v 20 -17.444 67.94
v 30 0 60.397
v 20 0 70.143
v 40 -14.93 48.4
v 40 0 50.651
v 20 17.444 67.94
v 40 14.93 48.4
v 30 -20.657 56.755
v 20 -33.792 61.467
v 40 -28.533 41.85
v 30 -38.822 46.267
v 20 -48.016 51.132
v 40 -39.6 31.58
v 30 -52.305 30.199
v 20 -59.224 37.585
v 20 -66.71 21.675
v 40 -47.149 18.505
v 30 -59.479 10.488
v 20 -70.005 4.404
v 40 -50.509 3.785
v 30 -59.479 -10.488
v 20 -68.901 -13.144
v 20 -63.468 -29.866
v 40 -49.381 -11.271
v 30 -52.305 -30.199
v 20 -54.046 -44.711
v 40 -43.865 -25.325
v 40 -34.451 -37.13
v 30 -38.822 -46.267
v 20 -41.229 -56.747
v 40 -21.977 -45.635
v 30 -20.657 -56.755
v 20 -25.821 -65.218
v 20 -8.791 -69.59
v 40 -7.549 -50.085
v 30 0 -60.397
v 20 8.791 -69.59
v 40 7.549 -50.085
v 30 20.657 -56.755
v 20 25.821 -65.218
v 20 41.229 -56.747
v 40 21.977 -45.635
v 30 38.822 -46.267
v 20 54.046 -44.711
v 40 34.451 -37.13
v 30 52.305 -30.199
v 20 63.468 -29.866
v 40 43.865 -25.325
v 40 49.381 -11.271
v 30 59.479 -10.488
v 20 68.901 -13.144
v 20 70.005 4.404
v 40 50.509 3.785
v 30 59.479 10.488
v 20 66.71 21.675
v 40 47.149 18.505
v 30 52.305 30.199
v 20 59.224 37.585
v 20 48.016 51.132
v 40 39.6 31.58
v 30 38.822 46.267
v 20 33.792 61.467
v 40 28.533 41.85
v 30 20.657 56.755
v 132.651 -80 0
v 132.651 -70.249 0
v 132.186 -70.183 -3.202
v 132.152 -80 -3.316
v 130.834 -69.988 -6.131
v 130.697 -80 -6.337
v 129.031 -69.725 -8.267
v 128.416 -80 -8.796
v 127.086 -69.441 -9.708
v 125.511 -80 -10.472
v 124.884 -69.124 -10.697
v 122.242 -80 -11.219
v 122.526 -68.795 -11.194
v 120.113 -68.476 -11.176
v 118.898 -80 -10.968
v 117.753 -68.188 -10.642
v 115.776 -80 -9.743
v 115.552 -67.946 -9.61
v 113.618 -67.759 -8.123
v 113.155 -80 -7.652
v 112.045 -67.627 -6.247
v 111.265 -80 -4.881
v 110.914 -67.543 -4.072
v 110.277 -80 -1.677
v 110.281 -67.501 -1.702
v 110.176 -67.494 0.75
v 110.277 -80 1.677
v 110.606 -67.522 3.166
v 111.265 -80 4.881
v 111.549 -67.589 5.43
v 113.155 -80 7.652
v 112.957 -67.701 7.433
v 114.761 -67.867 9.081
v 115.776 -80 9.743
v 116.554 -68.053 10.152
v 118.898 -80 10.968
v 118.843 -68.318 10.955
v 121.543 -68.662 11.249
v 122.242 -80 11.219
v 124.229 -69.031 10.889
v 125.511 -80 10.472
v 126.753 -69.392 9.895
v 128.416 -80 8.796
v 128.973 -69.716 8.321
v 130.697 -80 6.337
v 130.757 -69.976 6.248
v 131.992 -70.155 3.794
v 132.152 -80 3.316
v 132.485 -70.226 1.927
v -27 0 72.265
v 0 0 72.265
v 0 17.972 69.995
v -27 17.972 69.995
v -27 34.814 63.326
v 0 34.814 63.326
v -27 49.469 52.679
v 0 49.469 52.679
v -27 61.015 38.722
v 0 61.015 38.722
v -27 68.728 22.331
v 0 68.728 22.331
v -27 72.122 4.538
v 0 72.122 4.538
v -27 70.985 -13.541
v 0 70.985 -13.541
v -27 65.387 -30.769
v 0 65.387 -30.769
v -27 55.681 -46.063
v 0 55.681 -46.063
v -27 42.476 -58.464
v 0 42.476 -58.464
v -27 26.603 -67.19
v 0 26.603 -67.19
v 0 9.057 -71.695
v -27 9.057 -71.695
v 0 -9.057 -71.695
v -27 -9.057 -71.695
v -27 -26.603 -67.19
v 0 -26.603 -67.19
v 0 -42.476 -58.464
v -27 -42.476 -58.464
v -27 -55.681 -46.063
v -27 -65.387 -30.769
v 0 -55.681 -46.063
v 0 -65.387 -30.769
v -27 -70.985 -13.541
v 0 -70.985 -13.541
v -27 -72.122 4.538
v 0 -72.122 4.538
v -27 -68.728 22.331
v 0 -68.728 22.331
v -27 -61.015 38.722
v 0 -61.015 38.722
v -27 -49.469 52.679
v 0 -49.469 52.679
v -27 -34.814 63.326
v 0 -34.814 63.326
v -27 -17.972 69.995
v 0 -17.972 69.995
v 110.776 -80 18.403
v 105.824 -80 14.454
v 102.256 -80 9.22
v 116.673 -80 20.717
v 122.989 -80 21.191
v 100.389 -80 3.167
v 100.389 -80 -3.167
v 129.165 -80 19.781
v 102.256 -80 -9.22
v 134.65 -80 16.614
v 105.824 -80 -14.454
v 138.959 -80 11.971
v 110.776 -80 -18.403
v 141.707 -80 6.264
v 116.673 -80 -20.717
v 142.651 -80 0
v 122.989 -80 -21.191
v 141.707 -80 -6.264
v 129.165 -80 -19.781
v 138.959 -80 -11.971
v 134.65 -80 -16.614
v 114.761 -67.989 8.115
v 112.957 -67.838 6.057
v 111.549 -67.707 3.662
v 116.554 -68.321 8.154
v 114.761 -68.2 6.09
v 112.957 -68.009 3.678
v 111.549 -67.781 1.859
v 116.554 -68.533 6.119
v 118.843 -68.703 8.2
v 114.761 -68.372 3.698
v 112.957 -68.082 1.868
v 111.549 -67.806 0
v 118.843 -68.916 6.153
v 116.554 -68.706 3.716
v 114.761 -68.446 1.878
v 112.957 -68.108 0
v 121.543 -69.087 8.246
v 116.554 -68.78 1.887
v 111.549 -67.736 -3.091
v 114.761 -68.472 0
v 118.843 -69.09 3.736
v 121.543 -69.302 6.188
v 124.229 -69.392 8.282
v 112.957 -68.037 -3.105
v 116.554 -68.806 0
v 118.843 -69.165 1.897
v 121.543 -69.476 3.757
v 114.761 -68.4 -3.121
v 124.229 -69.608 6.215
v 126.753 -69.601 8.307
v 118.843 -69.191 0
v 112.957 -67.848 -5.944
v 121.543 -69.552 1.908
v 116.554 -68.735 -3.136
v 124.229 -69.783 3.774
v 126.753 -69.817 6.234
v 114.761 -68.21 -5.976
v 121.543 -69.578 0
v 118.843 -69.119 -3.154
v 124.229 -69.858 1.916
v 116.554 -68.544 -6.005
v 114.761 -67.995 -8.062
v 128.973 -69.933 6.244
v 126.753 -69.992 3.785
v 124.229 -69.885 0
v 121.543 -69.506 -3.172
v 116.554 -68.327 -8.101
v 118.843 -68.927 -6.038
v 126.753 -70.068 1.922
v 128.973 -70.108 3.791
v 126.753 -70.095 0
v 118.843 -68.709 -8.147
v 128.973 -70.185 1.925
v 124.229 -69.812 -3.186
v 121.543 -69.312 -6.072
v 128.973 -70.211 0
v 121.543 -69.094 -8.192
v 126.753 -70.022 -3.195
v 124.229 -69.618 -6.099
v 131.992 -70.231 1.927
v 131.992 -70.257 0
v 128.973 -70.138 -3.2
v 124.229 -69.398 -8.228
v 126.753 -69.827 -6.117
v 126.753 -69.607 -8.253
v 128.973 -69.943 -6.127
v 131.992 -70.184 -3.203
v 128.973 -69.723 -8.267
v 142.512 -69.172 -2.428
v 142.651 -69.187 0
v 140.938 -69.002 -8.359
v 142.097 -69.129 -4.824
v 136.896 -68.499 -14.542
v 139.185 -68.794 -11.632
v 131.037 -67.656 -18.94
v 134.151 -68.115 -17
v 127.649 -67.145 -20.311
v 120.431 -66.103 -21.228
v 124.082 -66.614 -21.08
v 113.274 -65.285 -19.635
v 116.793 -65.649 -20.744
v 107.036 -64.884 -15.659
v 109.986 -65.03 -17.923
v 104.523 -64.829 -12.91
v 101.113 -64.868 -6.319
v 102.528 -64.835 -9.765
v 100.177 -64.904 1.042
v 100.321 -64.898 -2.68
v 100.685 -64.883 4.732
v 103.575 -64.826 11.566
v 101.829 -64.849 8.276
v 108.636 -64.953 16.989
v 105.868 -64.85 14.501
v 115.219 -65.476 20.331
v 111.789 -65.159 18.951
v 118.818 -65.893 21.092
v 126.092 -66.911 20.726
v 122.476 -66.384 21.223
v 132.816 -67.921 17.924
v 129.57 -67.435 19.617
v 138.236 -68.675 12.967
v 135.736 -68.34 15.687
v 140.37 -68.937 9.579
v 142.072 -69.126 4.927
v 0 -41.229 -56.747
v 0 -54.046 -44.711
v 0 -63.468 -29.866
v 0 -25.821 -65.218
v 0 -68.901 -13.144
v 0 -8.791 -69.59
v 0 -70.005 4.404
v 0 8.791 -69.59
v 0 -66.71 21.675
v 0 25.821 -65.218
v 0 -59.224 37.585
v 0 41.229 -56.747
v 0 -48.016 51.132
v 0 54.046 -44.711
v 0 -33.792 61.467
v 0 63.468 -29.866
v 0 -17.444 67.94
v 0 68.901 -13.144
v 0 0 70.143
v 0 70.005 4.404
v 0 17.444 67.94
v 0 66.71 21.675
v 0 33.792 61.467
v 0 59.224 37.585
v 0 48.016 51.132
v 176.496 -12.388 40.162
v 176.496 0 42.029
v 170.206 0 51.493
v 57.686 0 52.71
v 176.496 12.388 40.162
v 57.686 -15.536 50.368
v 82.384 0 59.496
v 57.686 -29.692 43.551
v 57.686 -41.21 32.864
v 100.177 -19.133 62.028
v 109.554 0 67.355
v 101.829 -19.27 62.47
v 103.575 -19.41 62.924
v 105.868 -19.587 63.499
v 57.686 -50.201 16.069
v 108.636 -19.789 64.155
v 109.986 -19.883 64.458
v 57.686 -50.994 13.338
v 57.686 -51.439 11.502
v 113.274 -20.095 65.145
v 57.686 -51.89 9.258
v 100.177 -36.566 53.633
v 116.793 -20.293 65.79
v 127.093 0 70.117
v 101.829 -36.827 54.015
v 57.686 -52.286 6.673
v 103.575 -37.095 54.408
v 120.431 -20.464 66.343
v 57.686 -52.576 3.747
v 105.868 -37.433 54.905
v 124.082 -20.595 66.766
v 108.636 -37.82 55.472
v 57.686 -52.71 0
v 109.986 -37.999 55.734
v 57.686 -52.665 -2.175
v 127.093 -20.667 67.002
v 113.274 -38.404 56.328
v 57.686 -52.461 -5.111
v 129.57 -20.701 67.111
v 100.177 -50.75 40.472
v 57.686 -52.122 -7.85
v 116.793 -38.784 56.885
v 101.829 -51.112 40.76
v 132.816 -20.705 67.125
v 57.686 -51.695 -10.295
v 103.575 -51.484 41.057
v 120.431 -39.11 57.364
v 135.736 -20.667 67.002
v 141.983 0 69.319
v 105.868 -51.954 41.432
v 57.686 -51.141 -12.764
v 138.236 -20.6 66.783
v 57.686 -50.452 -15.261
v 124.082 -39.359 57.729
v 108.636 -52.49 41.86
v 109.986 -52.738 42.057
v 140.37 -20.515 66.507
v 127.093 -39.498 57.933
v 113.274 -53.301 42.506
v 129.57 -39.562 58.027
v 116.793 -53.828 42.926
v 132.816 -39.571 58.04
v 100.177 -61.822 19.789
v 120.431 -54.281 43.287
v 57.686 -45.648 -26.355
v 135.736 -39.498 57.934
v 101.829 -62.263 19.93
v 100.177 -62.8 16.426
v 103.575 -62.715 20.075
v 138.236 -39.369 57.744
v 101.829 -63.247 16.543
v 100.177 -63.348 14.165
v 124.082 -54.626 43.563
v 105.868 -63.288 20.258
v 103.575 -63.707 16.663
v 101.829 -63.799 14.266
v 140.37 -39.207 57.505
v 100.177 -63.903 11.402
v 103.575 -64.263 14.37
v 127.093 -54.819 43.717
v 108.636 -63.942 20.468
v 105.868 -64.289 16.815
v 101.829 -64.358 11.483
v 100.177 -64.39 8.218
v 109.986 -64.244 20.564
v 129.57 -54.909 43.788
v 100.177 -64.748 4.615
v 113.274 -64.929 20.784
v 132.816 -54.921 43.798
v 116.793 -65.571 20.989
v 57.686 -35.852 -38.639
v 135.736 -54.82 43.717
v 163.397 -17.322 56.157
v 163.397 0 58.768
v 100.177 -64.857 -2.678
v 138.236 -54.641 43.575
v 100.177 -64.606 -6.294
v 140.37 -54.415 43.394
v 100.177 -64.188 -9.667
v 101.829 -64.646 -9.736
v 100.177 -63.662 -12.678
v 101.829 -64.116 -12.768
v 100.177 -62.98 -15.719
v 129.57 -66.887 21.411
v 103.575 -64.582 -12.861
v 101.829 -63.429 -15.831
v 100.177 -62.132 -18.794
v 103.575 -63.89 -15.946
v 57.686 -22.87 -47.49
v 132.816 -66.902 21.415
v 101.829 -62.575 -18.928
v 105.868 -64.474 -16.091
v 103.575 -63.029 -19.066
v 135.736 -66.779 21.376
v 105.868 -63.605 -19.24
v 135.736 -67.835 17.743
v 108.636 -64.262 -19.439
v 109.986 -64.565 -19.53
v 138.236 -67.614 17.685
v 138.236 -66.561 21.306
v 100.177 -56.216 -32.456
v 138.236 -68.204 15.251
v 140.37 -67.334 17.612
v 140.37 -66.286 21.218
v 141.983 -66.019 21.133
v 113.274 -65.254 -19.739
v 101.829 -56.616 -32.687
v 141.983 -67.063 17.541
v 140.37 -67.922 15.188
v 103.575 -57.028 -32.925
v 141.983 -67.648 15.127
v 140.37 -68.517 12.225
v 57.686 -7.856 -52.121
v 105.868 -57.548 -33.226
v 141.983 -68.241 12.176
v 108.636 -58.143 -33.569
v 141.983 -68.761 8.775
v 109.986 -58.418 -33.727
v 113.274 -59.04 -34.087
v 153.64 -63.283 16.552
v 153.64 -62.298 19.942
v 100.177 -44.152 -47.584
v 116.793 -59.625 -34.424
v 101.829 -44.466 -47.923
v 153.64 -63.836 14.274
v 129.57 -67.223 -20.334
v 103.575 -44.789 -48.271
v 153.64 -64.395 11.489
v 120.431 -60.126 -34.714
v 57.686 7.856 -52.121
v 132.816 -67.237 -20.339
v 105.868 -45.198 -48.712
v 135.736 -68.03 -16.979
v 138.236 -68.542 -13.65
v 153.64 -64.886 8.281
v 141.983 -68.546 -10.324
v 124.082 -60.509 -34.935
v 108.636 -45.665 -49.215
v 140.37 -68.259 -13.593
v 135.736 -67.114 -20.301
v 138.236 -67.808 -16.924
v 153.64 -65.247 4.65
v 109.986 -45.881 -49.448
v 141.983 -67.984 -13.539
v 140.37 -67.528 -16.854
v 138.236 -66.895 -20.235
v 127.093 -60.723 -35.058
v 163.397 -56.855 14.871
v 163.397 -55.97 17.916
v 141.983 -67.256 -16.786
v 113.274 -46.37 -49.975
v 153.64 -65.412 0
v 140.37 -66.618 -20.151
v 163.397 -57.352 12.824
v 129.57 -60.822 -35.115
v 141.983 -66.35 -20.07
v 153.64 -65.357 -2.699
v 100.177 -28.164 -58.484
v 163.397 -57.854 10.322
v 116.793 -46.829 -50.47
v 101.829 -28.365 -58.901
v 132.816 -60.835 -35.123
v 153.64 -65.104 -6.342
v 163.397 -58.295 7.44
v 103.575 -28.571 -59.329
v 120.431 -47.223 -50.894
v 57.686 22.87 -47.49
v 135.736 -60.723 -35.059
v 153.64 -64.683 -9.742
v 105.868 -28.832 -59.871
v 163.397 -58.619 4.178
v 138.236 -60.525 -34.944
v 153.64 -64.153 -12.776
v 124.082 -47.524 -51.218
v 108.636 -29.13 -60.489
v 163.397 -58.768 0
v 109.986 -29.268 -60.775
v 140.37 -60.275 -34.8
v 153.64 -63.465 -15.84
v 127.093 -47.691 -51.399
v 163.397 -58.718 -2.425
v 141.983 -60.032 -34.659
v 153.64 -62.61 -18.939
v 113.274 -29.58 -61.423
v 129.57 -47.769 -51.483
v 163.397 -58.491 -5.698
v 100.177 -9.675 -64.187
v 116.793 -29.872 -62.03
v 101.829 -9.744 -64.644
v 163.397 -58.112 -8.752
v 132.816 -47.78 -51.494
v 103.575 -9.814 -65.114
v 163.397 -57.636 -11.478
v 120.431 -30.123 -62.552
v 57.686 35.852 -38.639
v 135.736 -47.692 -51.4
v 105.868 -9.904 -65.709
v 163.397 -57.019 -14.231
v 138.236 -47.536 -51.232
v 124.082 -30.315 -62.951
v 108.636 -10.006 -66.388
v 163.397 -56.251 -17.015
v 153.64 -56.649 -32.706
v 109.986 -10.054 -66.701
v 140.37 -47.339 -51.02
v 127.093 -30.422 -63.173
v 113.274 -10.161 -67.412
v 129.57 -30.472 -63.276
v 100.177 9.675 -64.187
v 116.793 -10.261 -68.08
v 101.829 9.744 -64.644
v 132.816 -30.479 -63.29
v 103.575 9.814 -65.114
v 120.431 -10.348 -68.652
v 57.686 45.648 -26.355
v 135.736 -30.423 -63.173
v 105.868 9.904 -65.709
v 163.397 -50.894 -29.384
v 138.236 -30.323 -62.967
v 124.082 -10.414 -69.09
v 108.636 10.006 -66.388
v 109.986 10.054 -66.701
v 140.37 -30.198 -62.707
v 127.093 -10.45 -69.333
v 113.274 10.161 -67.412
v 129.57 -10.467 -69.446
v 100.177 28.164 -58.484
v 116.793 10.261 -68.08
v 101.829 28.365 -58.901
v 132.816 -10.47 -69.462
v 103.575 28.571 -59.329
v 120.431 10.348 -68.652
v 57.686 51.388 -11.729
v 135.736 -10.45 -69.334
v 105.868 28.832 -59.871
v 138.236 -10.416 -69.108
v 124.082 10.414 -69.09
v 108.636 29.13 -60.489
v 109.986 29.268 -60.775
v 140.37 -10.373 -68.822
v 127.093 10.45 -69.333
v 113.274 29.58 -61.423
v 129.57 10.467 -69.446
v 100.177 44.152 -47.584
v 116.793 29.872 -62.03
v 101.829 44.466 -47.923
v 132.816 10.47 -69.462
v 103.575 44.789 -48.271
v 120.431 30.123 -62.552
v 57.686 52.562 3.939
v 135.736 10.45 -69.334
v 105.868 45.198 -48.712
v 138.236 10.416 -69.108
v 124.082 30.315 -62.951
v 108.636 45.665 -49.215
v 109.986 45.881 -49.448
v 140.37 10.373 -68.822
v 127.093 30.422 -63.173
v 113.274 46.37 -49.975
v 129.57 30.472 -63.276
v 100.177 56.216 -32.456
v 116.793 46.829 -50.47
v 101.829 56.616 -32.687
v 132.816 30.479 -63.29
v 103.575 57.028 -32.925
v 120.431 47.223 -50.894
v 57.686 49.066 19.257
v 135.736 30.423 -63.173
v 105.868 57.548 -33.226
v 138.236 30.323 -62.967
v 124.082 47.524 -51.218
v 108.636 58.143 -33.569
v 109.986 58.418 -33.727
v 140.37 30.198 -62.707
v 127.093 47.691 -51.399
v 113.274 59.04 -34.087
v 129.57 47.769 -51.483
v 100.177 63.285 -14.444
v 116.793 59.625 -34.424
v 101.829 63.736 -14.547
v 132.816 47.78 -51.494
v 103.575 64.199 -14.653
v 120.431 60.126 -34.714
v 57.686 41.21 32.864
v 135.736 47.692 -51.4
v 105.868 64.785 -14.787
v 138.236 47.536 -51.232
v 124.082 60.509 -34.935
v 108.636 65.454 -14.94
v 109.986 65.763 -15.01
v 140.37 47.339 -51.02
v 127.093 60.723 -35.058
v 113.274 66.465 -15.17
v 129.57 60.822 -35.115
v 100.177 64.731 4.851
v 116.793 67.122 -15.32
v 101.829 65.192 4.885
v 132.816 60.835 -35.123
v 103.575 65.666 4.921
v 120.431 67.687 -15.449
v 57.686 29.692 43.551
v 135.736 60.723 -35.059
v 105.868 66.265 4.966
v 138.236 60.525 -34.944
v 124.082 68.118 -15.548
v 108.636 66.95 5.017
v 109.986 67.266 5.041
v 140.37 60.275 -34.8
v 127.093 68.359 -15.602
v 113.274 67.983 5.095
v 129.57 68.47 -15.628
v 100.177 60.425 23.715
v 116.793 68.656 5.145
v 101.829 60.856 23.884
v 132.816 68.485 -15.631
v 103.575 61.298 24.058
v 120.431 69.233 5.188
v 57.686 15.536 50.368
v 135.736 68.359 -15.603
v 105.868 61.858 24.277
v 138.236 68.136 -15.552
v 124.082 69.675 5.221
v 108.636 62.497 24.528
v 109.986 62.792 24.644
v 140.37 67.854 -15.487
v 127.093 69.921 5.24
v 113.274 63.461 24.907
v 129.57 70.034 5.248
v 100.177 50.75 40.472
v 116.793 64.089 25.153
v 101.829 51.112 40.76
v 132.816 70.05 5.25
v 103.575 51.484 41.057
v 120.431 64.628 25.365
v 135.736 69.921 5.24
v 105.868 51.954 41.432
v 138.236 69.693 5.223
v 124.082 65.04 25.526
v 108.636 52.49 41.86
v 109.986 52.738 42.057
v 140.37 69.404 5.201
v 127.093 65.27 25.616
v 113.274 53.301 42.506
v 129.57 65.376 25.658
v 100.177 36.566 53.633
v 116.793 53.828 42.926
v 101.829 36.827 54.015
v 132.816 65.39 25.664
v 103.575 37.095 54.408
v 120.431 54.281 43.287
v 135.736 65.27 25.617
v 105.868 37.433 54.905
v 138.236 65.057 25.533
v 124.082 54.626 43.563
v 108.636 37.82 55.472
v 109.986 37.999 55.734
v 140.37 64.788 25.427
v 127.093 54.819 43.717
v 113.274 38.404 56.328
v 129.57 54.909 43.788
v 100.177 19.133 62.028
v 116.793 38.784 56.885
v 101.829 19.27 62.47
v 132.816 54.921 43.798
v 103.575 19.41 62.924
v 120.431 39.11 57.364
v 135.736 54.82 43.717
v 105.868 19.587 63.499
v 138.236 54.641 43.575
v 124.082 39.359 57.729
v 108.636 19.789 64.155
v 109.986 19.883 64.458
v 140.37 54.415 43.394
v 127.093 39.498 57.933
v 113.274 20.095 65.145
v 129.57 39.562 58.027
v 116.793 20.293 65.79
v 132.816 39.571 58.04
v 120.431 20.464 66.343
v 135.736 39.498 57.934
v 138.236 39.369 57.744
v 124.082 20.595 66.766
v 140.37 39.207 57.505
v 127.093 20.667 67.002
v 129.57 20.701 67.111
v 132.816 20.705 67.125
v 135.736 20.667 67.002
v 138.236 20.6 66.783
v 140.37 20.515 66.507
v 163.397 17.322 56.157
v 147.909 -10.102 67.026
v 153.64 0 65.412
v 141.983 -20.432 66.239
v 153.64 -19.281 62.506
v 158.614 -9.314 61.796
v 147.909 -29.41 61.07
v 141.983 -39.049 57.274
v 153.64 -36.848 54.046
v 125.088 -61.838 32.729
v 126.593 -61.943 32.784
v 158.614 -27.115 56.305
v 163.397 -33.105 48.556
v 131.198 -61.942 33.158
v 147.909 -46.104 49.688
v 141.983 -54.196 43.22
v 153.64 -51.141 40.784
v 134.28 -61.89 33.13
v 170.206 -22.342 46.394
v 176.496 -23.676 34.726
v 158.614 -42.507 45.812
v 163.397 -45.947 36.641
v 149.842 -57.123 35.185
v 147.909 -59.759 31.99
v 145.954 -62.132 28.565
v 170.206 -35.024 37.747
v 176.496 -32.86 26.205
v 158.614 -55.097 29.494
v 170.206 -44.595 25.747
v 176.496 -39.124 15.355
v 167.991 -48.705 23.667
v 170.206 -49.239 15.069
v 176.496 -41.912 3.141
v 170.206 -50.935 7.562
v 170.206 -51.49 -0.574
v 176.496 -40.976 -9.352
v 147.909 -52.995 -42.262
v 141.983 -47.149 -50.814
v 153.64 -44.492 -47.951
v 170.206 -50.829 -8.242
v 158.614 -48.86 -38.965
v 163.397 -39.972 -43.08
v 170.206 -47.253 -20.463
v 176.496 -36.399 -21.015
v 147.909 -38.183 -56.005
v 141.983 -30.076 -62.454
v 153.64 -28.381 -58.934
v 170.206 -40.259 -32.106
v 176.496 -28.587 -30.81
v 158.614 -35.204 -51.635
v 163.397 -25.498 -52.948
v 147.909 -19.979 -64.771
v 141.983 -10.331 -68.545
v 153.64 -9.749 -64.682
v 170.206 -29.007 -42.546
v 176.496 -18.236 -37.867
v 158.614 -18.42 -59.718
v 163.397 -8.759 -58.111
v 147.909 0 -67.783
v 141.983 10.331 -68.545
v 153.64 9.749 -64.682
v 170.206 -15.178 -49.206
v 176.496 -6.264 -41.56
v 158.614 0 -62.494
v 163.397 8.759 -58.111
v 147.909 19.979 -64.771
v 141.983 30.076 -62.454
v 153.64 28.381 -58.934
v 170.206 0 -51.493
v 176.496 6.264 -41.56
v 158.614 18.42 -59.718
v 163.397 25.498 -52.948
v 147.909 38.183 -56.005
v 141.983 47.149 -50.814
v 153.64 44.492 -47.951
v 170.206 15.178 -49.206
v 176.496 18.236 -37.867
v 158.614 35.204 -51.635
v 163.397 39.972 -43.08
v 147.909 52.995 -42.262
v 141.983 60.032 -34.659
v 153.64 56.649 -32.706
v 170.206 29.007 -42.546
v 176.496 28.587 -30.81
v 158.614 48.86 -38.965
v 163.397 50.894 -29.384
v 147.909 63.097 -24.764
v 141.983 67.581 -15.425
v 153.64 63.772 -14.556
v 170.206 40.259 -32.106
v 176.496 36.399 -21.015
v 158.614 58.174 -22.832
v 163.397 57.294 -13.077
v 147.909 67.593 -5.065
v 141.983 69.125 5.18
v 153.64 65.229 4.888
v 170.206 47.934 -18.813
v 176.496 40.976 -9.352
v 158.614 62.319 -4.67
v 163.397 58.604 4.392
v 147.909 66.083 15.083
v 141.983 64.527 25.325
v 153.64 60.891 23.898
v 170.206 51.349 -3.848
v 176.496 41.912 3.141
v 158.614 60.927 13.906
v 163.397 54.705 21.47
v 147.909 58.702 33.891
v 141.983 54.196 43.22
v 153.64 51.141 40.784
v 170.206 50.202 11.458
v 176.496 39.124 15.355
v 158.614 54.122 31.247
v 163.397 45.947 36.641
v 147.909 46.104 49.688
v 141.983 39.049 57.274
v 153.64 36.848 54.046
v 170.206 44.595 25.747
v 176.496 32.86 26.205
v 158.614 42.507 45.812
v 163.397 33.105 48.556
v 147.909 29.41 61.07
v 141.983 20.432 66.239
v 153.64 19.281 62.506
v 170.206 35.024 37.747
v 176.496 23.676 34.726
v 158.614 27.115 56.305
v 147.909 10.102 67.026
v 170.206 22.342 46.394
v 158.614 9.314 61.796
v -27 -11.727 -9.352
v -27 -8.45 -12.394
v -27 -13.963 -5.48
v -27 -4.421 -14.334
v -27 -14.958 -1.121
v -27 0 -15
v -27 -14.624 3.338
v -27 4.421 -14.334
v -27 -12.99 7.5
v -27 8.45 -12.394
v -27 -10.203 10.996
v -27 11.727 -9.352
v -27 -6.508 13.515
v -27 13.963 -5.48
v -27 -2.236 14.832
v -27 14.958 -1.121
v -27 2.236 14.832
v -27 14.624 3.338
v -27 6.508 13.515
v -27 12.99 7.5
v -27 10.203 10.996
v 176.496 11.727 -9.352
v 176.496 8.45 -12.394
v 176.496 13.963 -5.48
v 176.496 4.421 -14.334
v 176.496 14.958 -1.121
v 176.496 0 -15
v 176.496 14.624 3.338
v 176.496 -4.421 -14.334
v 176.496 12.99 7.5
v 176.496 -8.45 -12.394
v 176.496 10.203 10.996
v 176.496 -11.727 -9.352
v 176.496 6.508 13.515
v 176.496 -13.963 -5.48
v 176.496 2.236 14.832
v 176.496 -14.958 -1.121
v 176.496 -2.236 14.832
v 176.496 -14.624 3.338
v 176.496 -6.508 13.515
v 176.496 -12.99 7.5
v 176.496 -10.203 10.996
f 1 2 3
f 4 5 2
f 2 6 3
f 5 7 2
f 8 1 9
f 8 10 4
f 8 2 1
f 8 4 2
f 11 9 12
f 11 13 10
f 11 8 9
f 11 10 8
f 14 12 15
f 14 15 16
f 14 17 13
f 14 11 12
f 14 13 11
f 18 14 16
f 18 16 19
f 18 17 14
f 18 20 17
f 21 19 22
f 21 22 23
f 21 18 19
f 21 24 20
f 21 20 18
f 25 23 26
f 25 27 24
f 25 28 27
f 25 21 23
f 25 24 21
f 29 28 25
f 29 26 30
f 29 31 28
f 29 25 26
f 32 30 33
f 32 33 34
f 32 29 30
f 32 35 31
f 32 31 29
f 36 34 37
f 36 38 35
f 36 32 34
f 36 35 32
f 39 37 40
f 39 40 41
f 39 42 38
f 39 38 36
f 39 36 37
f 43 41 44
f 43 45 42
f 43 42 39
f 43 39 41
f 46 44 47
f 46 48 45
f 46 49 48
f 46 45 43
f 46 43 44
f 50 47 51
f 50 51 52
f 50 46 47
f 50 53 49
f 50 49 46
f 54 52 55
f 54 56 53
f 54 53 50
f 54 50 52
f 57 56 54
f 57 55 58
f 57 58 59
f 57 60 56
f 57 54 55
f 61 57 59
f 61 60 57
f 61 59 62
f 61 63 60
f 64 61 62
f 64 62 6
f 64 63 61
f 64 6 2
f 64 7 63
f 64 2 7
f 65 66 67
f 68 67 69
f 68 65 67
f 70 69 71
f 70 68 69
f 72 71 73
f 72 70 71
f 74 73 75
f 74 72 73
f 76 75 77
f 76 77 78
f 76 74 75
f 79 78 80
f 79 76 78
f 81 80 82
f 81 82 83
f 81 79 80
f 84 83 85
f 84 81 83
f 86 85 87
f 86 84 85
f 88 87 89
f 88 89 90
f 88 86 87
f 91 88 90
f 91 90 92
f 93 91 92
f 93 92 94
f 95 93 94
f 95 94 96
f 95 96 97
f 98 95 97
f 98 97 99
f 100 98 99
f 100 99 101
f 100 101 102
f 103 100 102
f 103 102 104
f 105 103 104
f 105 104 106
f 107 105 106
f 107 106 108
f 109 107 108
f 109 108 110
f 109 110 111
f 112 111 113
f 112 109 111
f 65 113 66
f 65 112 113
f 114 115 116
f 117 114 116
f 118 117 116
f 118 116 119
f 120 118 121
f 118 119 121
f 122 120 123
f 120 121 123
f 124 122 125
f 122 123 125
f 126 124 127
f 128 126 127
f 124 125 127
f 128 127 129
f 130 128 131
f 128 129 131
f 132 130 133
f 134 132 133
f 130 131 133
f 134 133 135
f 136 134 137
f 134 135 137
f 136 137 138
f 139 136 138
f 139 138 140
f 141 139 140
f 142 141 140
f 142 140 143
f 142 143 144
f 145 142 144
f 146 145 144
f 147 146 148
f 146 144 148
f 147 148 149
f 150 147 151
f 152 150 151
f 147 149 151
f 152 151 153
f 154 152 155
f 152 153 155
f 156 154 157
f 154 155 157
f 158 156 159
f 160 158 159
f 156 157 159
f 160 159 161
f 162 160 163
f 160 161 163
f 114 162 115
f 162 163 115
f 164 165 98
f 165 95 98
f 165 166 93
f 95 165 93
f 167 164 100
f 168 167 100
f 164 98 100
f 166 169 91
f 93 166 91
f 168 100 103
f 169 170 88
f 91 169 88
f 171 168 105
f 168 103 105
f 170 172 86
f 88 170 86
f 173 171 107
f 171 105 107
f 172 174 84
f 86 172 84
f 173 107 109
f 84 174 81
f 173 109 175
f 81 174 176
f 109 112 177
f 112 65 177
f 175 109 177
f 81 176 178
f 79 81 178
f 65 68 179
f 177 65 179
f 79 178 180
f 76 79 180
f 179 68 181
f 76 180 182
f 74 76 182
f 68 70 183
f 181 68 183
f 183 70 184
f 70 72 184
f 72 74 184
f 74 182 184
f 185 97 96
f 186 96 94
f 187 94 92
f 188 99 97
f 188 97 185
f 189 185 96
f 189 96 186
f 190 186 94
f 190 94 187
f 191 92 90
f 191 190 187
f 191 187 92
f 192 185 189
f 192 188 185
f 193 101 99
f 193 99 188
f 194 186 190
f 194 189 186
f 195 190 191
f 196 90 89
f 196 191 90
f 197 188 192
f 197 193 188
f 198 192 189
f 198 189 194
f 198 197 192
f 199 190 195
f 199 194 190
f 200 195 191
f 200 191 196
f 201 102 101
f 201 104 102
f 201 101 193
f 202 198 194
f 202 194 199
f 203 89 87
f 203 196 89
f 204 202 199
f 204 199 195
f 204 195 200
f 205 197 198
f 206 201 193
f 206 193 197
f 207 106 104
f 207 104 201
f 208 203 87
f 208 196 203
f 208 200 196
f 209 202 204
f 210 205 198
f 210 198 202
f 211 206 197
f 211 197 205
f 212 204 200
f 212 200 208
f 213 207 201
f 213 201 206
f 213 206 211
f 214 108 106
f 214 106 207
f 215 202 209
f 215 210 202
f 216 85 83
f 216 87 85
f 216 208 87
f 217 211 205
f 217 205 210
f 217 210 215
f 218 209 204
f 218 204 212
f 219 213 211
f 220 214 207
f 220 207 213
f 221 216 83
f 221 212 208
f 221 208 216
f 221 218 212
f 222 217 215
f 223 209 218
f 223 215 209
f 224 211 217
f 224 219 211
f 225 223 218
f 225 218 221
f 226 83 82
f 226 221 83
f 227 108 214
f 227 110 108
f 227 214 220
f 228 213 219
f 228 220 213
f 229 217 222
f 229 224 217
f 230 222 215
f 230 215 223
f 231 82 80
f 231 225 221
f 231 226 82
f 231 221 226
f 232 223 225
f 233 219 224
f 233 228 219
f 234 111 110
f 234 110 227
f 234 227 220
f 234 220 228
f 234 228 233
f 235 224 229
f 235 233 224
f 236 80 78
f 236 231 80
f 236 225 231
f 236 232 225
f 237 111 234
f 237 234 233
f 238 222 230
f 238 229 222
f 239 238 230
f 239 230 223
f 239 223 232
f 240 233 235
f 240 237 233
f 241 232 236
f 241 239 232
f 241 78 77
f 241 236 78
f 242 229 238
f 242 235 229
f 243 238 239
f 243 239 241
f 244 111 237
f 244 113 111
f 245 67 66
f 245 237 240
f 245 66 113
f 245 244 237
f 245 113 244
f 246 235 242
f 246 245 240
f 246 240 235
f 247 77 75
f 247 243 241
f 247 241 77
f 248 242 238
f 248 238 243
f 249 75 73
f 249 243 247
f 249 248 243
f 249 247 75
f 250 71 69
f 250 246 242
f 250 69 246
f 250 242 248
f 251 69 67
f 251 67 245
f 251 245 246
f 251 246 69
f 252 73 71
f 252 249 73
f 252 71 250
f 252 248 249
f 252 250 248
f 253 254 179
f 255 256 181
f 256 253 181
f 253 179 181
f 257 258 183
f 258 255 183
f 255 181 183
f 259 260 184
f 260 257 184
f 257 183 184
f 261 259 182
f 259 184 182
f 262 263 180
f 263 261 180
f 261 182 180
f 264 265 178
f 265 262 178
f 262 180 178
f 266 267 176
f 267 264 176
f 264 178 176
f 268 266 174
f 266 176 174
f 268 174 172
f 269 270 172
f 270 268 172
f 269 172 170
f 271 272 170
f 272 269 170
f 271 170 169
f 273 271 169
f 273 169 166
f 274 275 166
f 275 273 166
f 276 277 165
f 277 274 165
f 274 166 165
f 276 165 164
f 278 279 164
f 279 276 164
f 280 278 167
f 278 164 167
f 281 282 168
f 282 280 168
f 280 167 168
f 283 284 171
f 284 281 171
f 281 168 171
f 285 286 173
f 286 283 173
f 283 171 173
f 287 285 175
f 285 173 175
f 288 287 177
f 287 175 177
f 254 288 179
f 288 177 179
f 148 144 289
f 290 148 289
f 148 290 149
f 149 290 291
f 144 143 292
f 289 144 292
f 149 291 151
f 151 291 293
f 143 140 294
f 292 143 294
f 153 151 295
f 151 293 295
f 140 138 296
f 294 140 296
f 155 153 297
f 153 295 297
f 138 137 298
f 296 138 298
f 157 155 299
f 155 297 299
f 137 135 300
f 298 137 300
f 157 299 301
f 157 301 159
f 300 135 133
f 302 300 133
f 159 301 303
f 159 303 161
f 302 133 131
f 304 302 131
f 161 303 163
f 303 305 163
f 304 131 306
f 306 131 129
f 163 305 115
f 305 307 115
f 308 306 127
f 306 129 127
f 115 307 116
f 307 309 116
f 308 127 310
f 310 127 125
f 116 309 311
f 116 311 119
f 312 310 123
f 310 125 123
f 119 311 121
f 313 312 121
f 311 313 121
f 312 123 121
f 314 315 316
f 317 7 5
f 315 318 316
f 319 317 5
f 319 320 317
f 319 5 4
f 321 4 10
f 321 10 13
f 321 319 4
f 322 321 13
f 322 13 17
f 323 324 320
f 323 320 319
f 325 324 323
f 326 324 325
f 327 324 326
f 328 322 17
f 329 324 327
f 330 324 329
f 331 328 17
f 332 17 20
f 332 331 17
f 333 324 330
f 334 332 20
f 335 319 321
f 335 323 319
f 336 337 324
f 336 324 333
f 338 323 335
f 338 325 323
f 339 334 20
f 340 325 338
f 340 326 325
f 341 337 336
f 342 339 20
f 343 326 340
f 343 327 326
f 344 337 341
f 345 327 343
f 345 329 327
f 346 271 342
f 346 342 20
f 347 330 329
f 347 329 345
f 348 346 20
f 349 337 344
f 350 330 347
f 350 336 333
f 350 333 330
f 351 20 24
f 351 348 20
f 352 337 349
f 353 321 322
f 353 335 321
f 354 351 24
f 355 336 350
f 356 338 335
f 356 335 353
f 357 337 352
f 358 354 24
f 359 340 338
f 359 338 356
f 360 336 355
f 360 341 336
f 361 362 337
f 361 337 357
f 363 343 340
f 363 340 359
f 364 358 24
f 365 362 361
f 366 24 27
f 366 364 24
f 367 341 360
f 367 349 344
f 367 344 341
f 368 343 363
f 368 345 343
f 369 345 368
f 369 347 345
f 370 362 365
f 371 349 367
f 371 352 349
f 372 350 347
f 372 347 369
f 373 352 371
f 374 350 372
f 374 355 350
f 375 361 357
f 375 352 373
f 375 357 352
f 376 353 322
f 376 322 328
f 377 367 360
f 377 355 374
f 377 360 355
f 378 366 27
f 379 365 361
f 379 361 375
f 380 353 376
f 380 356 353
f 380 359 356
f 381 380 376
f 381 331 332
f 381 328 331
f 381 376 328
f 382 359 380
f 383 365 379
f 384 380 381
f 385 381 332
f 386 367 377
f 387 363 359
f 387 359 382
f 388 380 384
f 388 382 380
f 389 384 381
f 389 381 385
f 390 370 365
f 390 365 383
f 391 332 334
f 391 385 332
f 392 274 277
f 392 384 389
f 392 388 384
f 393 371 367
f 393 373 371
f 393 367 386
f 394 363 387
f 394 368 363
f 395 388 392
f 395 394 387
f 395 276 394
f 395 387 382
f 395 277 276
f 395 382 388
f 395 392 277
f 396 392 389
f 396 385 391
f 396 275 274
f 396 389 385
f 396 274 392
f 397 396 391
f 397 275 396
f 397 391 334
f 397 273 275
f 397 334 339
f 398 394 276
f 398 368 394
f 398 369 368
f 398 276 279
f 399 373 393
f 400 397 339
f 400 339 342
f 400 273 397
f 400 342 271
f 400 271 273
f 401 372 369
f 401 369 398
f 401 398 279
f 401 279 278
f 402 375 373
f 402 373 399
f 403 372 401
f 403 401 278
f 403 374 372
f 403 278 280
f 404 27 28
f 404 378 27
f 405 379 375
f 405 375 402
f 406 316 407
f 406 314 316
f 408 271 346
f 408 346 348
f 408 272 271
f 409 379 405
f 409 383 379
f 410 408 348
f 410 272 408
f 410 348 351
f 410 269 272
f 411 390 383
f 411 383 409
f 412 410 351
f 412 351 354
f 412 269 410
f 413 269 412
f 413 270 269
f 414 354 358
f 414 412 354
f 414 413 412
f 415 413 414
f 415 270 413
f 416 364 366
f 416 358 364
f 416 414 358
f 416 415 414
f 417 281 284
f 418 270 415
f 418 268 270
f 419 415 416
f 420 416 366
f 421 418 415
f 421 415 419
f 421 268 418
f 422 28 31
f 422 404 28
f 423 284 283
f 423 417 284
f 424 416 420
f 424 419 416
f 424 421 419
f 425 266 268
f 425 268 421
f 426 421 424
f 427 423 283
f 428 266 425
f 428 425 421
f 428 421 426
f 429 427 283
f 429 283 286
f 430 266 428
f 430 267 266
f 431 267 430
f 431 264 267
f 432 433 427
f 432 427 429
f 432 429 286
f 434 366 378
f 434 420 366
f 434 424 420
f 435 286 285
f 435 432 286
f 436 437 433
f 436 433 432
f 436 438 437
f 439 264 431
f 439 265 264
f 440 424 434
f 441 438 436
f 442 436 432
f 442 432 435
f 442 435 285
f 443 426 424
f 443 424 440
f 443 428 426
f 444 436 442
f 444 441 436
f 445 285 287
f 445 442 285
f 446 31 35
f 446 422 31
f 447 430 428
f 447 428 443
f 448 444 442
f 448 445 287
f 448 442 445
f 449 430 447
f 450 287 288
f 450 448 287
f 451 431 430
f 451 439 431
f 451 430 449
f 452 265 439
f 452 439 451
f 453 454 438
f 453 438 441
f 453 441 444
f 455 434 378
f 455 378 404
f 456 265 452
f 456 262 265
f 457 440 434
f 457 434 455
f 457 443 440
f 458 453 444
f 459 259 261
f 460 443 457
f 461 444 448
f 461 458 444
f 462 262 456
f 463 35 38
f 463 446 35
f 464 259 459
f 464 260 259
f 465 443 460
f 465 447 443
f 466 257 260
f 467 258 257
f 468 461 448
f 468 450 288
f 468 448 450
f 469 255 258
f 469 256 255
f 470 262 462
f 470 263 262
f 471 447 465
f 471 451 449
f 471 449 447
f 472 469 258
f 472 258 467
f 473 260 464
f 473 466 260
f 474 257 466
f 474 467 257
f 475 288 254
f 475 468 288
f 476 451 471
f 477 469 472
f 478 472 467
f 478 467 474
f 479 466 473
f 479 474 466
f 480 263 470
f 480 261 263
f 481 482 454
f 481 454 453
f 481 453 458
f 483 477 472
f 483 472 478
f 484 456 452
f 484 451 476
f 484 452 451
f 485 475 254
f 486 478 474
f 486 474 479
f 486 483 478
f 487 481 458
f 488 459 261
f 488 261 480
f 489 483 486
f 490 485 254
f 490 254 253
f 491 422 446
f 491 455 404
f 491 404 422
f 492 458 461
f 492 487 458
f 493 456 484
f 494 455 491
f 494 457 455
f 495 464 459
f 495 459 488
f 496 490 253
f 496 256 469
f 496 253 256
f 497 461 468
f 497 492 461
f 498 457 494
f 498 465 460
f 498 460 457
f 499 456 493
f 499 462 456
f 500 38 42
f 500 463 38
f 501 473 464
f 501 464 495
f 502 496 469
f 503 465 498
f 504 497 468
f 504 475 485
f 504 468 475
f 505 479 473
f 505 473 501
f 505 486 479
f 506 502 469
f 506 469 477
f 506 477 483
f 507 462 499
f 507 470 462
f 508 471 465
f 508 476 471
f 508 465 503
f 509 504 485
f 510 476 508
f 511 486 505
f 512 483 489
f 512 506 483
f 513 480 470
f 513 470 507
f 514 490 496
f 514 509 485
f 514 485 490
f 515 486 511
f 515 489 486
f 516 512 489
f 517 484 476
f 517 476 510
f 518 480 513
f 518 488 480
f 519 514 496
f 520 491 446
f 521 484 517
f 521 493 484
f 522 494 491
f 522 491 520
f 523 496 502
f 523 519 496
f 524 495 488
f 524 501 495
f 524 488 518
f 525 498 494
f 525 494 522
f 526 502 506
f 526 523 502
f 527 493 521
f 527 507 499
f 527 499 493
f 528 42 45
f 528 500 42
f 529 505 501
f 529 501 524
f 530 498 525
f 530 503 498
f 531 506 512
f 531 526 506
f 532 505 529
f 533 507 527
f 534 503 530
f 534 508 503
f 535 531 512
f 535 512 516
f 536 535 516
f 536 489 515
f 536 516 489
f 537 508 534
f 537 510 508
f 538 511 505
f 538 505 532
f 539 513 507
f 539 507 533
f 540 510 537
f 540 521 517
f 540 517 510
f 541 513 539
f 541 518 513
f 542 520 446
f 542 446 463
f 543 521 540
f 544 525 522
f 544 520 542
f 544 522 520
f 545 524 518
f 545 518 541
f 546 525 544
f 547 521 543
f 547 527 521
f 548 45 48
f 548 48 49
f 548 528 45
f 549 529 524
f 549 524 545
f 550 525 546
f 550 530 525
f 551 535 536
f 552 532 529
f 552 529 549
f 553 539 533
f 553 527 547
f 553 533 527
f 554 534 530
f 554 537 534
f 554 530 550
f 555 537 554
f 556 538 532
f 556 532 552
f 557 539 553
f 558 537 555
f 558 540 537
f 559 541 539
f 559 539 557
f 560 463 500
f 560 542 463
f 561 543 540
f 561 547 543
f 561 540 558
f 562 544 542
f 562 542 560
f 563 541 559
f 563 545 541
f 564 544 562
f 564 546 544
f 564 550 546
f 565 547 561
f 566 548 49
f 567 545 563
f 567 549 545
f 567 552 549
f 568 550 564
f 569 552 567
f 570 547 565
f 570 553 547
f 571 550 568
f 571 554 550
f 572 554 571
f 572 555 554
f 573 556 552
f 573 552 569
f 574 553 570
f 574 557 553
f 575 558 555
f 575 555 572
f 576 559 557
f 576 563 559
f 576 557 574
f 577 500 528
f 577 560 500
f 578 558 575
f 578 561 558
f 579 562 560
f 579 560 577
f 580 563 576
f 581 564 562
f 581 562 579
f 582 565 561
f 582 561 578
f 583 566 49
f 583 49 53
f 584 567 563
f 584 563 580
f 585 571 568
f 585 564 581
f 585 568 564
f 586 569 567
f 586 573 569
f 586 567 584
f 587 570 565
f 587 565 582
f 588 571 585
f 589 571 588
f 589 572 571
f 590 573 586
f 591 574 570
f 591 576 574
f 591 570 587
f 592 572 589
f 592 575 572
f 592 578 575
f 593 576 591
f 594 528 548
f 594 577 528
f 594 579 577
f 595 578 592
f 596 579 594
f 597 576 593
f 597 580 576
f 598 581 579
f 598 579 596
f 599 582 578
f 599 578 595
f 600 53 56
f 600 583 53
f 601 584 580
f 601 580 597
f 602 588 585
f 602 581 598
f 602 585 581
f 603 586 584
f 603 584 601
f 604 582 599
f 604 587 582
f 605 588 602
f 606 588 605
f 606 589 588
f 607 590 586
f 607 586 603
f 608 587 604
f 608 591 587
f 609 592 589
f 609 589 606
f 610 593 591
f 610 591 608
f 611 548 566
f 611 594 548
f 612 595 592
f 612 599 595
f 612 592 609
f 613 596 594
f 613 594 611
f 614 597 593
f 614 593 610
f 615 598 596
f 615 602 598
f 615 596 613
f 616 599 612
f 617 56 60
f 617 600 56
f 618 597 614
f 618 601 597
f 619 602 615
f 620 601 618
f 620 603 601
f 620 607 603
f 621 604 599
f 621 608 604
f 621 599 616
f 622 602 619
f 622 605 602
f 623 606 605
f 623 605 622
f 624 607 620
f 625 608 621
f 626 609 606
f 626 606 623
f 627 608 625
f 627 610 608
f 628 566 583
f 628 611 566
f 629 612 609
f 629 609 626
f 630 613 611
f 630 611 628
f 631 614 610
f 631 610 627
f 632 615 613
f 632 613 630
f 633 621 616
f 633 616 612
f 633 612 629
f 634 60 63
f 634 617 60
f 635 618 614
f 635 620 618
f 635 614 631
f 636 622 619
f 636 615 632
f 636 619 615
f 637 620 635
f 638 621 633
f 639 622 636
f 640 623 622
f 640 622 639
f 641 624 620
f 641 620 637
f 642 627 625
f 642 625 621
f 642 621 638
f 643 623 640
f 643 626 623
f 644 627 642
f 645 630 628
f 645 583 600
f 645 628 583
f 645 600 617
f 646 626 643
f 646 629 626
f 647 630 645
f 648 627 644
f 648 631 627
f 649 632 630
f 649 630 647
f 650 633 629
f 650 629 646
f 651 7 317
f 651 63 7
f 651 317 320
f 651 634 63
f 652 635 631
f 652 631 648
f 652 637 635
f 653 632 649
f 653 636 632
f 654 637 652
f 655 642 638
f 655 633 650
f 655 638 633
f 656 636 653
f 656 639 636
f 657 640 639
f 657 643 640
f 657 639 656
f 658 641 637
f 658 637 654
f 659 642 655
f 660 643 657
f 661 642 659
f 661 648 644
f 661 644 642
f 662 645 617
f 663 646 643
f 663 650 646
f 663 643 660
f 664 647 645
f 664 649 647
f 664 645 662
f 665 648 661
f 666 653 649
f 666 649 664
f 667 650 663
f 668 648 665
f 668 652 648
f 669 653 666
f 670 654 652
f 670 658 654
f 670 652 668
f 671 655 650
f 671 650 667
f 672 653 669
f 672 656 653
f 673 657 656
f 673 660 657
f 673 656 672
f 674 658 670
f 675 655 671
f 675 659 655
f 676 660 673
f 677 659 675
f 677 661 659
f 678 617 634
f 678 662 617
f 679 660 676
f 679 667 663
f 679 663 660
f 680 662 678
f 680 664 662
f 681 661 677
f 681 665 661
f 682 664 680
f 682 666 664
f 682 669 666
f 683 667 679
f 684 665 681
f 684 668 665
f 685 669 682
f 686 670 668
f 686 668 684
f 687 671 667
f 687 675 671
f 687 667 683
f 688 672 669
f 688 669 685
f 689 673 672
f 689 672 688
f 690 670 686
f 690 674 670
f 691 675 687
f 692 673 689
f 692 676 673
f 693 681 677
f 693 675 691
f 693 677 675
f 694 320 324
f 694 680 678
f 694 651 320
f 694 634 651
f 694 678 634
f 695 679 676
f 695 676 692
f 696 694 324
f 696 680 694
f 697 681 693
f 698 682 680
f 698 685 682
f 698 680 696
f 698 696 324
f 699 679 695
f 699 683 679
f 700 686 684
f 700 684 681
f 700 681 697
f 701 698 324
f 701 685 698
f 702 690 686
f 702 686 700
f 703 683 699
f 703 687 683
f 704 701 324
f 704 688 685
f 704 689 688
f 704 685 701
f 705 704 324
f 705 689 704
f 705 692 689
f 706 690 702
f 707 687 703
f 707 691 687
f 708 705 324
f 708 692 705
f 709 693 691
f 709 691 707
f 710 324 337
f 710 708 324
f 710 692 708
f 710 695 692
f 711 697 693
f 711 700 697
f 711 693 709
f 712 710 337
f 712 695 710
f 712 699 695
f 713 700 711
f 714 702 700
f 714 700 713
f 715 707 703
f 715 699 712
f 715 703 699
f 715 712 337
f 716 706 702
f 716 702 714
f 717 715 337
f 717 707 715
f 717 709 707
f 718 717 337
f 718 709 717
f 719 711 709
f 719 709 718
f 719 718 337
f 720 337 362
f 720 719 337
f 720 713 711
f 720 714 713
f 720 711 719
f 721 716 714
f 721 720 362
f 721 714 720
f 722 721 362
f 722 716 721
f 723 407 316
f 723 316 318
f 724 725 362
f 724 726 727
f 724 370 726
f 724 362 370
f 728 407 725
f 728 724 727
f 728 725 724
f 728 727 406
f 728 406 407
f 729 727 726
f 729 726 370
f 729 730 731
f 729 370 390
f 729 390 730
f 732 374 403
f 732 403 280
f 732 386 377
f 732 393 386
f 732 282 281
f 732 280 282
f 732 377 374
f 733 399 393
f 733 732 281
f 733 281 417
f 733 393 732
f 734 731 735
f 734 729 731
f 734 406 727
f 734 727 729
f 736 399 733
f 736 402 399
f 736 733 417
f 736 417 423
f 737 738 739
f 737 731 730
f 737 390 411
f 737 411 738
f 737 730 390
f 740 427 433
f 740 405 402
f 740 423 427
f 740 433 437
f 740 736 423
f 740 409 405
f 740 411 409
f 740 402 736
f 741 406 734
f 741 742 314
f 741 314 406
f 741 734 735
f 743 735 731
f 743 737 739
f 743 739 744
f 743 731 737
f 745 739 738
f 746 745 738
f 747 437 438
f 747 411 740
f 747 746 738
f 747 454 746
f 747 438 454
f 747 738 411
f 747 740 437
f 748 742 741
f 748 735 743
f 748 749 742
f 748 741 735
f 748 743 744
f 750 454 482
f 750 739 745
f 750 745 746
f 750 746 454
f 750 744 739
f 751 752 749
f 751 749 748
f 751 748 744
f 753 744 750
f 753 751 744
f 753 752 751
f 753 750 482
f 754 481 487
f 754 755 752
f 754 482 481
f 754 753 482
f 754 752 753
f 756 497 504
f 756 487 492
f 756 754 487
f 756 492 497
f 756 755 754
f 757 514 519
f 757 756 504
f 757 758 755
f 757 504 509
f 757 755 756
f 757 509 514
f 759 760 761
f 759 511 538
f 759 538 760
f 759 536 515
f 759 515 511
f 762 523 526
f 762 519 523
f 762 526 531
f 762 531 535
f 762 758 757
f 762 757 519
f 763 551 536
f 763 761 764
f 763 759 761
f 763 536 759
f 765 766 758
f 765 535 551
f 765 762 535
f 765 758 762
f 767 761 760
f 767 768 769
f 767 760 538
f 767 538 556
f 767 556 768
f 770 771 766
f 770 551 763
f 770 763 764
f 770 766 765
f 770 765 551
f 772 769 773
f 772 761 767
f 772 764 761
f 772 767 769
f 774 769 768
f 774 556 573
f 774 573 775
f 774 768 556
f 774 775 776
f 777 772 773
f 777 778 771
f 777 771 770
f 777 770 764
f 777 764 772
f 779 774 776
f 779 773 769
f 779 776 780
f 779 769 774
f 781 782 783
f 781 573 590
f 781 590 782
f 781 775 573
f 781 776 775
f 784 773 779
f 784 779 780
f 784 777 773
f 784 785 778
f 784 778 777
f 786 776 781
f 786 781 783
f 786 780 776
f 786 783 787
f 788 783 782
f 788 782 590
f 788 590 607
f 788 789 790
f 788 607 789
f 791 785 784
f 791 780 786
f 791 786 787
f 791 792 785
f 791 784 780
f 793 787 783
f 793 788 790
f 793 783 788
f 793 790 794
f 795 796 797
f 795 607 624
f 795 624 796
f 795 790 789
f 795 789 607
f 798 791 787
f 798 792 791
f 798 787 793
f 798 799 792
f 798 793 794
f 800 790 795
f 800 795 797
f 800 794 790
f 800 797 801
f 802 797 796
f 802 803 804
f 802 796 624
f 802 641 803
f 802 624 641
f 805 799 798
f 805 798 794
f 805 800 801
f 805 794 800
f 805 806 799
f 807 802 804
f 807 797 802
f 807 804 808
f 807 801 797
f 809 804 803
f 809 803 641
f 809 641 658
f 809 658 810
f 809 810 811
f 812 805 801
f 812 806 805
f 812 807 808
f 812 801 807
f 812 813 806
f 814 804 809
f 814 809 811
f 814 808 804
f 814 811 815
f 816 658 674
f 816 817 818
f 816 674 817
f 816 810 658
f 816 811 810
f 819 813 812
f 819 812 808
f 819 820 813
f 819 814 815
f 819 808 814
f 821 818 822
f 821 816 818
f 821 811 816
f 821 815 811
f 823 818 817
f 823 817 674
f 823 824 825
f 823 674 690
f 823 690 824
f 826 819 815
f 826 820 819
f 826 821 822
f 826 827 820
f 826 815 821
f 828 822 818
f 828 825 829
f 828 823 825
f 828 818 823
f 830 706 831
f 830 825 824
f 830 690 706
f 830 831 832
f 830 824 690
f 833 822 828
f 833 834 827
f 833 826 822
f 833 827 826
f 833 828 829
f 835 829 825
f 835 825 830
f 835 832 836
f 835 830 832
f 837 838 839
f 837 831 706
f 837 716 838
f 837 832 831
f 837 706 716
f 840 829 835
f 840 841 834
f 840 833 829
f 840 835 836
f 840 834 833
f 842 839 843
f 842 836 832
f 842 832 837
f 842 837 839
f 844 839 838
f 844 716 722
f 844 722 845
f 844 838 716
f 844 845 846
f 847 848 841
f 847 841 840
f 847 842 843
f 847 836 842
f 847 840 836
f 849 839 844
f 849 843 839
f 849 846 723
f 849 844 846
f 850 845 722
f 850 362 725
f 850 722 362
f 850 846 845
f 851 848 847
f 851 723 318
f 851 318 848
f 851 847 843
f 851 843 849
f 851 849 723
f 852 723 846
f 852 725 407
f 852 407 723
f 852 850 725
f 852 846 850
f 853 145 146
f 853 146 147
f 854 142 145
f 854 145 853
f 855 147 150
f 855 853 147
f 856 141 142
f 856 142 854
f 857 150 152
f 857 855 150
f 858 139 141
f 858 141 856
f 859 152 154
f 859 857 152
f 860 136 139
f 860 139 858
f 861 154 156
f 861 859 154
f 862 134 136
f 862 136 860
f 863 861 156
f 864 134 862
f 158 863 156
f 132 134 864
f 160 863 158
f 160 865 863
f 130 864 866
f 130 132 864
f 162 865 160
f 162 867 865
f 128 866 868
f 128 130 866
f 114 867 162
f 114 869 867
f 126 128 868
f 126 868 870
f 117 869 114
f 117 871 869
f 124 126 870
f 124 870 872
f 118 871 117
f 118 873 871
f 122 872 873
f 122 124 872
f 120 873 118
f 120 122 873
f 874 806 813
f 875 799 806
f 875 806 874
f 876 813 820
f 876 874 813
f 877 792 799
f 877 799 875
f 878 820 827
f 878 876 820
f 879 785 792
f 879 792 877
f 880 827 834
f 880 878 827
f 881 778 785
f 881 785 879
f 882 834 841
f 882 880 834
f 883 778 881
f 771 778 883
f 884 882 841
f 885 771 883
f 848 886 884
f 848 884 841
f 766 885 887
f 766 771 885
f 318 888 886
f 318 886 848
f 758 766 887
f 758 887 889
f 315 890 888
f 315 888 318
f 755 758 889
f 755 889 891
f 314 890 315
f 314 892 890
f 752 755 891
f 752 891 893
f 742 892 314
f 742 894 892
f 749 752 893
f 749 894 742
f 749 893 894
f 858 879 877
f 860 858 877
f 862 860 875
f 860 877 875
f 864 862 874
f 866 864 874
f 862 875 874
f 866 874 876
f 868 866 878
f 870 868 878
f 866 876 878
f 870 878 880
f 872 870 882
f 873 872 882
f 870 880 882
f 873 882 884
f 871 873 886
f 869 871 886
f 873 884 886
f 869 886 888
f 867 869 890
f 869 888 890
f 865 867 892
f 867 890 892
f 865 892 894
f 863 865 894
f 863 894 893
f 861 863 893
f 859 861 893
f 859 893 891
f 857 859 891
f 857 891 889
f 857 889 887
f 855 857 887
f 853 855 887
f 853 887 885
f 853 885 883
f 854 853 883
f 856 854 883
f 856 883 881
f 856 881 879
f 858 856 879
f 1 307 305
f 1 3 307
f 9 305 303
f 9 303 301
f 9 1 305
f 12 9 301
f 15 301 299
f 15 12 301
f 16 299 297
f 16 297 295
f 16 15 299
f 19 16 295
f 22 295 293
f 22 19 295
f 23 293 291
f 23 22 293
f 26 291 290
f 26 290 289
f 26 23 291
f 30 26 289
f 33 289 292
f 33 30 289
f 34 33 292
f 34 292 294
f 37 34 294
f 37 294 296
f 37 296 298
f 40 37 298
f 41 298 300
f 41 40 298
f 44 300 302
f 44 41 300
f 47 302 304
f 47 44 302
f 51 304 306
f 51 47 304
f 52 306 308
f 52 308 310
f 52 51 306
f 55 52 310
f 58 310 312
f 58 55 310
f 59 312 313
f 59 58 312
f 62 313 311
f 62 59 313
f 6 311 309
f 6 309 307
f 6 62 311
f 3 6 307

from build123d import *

# Parameters (mm, degrees)
EXTRUDE_1_DEPTH      = 33
EXTRUDE_1_DEPTH_BACK = 10
SKETCH_3_R           = 21.25
SKETCH_3_R_2         = 11.25
SKETCH_4_R           = 72.26496
EXTRUDE_1_2_DEPTH    = 27
SKETCH_2_R           = 15
CUT_EXTRUDE_1_DEPTH  = 220


with BuildPart() as part:
    # 草圖1 → 旋轉1 (revolve)
    with BuildSketch(Plane.XY, mode=Mode.PRIVATE) as revolve_1_sk:
        with BuildLine():
            Line((0, 0), (0, 70.143356265))
            Line((0, 70.143356265), (20, 70.143356265))
            Line((20, 70.143356265), (40, 50.650757283))
            add(Edge.make_bspline(
                [(40, 50.650757283), (85.38972146, 50.733312628), (143.705322116, 100.003369352), (176.495570272, 42.029481433)],
                knots=[0, 0, 0, 0, 1, 1, 1, 1], degree=3))
            Line((176.495570272, 42.029481433), (176.495570272, 0))
            Line((176.495570272, 0), (0, 0))
        make_face()
    revolve(revolve_1_sk.sketch.rotate(Axis((0, 0, 0), (1, 0, 0)), 90), axis=Axis((0, 0, 0), (1, 0, 0)))

    # 草圖3 → Extrude 1 (add, two sides: drawn at the far end of the back side and taken through both)
    with BuildSketch(Plane(origin=(0, -70, 0), x_dir=(1, 0, 0), z_dir=(0, 1, 0)).offset(-EXTRUDE_1_DEPTH_BACK)):
        with Locations((121.401340983, 0)):
            Circle(SKETCH_3_R)
        with Locations((121.401340983, 0)):
            Circle(SKETCH_3_R_2, mode=Mode.SUBTRACT)
    extrude(amount=EXTRUDE_1_DEPTH + EXTRUDE_1_DEPTH_BACK)

    # 草圖4 → Extrude 1 2 (add)
    with BuildSketch(Plane.ZY):
        Circle(SKETCH_4_R)
    extrude(amount=EXTRUDE_1_2_DEPTH)

    # 草圖2 → 除料-伸長1 (cut)
    with BuildSketch(Plane(origin=(176.495570272, 0, 0), x_dir=(0, 0, -1), z_dir=(1, 0, 0))):
        Circle(SKETCH_2_R)
    extrude(amount=-CUT_EXTRUDE_1_DEPTH, mode=Mode.SUBTRACT)


solid = part.part
